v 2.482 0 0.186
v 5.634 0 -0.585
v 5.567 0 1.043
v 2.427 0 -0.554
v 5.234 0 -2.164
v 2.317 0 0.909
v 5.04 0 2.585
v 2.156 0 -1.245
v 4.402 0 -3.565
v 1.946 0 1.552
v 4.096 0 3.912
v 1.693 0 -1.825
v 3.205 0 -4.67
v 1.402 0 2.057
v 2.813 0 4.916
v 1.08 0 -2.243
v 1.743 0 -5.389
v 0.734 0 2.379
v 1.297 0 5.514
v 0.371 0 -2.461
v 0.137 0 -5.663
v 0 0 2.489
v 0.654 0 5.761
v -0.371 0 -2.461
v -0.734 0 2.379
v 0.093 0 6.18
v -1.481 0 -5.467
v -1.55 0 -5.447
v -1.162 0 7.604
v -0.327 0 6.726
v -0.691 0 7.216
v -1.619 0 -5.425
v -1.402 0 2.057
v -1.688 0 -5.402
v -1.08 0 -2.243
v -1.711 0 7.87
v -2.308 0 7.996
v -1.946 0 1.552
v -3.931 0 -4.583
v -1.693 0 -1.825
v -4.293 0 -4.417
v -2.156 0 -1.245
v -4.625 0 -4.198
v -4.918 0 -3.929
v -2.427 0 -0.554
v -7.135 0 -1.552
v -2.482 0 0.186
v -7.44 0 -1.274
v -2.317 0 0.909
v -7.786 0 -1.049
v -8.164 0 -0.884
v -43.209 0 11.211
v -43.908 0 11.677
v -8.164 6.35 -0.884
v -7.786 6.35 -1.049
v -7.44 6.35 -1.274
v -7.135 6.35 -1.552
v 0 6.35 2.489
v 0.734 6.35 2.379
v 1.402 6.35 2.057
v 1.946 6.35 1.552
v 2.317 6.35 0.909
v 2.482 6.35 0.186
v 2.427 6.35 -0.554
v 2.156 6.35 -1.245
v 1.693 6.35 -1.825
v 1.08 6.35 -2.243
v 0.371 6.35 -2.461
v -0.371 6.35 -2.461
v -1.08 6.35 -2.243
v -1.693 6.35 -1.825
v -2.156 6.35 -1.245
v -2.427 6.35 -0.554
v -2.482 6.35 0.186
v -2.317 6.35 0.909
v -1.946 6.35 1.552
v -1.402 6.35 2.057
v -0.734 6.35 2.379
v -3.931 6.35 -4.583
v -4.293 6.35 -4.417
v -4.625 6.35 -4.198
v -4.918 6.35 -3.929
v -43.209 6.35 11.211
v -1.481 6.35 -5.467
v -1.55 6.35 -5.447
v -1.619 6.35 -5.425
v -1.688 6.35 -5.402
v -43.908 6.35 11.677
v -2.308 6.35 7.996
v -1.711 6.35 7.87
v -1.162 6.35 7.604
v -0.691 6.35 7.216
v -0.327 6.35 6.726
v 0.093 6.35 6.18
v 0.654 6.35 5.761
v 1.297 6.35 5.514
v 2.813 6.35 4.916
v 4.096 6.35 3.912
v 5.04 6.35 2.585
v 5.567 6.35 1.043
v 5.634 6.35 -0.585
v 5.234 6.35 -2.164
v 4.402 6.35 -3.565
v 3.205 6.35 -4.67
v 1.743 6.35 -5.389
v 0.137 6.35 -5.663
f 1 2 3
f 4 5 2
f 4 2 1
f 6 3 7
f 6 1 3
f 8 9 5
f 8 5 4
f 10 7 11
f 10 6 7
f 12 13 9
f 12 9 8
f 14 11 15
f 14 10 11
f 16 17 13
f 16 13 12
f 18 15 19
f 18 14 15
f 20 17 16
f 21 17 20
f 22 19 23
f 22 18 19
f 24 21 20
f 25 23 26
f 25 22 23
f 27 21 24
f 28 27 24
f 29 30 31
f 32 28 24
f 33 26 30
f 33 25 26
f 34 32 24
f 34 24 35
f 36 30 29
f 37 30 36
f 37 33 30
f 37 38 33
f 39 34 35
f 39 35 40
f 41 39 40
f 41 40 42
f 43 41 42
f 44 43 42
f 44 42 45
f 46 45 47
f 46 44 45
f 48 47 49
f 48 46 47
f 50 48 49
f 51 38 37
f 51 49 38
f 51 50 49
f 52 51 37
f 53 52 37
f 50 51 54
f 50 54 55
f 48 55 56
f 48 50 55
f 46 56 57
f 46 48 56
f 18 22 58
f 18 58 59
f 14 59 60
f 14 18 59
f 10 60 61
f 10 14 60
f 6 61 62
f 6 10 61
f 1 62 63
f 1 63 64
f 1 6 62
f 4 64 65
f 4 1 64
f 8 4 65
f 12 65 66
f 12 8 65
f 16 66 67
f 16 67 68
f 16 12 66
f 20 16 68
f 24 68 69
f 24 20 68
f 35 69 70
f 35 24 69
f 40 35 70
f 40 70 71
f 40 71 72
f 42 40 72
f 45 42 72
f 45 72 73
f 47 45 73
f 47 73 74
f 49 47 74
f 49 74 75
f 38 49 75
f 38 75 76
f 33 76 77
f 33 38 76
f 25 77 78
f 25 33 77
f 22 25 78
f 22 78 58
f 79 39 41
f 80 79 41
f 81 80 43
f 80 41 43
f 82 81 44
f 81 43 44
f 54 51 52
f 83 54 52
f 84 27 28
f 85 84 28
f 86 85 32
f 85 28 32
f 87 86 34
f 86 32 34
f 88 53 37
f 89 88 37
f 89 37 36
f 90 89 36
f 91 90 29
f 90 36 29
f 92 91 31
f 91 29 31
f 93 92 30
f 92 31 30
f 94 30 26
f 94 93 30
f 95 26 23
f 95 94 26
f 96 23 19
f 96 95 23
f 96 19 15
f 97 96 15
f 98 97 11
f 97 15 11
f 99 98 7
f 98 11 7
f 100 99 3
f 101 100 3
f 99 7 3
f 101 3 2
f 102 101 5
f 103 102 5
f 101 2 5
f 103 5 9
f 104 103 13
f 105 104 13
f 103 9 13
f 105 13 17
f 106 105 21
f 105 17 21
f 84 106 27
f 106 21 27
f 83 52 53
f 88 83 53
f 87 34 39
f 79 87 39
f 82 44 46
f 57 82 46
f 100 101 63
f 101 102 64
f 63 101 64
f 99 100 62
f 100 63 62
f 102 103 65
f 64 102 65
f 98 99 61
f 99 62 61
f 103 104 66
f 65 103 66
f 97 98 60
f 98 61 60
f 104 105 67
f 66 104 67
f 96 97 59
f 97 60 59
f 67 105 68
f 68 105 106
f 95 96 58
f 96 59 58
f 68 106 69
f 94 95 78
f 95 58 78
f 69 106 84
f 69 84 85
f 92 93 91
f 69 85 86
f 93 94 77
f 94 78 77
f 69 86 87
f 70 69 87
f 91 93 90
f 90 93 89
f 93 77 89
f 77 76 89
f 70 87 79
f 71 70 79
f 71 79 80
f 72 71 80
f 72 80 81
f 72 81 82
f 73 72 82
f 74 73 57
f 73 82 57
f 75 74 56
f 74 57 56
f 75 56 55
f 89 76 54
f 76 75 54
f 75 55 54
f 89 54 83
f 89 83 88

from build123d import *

# Parameters (mm, degrees)
SKETCH1_R           = 2.4892
BOSS_EXTRUDE1_DEPTH = 6.35
FILLET1_R           = 2.54
FILLET2_R           = 2.54


with BuildPart() as part:
    # Sketch1 → Boss-Extrude1 (new body)
    with BuildSketch(Plane(origin=(0, 0, 0), x_dir=(1, 0, 0), z_dir=(0, 1, 0))):
        with BuildLine():
            Line((-1.600744285, 5.433302805), (-4.502878037, 4.373943057))
            Line((-4.502878037, 4.373943057), (-7.566118931, 1.089743665))
            Line((-7.566118931, 1.089743665), (-43.208775226, -11.210846355))
            Line((-43.208775226, -11.210846355), (-43.907997659, -11.677108885))
            Line((-43.907997659, -11.677108885), (0, -7.791786745))
            Line((0, -7.791786745), (0, -5.6642))
            ThreePointArc((0, -5.6642), (5.606178529, 0.808655641), (-1.600744285, 5.433302805))
        make_face()
        with Locations(Location((0, 0, 0), (0, 0, 270))):
            Circle(SKETCH1_R, mode=Mode.SUBTRACT)
    extrude(amount=BOSS_EXTRUDE1_DEPTH)

    # Fillet1
    # the kernel refuses this fillet: 2.54 mm, written as the material it adds along each edge
    with BuildSketch(Plane(origin=(-7.566118931, 0, -1.089743665), x_dir=(0.6820787973115132, 0, -0.7312786844001947), z_dir=(0, 1, 0))) as fillet1_piece_1:
        with BuildLine():
            CenterArc((FILLET1_R * 0.248898879334, FILLET1_R), FILLET1_R, 242.04630063, 27.95369937)
            Line((-FILLET1_R * 0.219859021674, FILLET1_R * 0.11667331624), (0, 0))
            Line((0, 0), (FILLET1_R * 0.248898879334, 0))
        make_face()
    extrude(amount=6.35)
    # the kernel refuses this fillet: 2.54 mm, written as the material it takes off along each edge
    with BuildSketch(Plane(origin=(0, -5.793464316, 7.791786745), x_dir=(0, 0, -1), z_dir=(0, 1, 0))) as fillet1_2_piece_1:
        with BuildLine():
            CenterArc((2.325851575, 2.532250196), FILLET1_R, 185.056806539, 80.466301584)
            Line((-0.204262229, 2.308365991), (0, 0))
            Line((0, 0), (2.127586745, 0))
        make_face()
    extrude(amount=17.936928632, mode=Mode.SUBTRACT)
    with BuildSketch(Plane(origin=(-1.600744285, -0.311653756, -5.433302805), x_dir=(-0.9393728970341759, 0, 0.34289730287306086), z_dir=(0, 1, 0))) as fillet1_2_piece_2:
        with BuildLine():
            CenterArc((0.092583262, 2.54), FILLET1_R, 265.101357171, 4.898642829)
            ThreePointArc((-0.124315777, 0.009277809), (-0.062183413, 0.004296891), (0, 0))
            Line((0, 0), (0.092583262, 0))
        make_face()
    extrude(amount=6.973307511, mode=Mode.SUBTRACT)
    with BuildSketch(Plane(origin=(-4.502878037, -1.520996143, -4.373943057), x_dir=(0.9393728970341768, 0, -0.34289730287305803), z_dir=(0, 1, 0))) as fillet1_2_piece_3:
        with BuildLine():
            CenterArc((FILLET1_R * 0.239526951609, -FILLET1_R), FILLET1_R, 90, 26.940206001)
            Line((-FILLET1_R * 0.213533444751, -FILLET1_R * 0.108520175635), (0, 0))
            Line((0, 0), (FILLET1_R * 0.239526951609, 0))
        make_face()
    extrude(amount=9.391992285, mode=Mode.SUBTRACT)

    # Fillet2
    fillet2_edges = [part.edges().sort_by_distance(p)[0] for p in [
        (0, 3.175, 5.6642),
    ]]
    fillet(fillet2_edges, radius=FILLET2_R)


solid = part.part
